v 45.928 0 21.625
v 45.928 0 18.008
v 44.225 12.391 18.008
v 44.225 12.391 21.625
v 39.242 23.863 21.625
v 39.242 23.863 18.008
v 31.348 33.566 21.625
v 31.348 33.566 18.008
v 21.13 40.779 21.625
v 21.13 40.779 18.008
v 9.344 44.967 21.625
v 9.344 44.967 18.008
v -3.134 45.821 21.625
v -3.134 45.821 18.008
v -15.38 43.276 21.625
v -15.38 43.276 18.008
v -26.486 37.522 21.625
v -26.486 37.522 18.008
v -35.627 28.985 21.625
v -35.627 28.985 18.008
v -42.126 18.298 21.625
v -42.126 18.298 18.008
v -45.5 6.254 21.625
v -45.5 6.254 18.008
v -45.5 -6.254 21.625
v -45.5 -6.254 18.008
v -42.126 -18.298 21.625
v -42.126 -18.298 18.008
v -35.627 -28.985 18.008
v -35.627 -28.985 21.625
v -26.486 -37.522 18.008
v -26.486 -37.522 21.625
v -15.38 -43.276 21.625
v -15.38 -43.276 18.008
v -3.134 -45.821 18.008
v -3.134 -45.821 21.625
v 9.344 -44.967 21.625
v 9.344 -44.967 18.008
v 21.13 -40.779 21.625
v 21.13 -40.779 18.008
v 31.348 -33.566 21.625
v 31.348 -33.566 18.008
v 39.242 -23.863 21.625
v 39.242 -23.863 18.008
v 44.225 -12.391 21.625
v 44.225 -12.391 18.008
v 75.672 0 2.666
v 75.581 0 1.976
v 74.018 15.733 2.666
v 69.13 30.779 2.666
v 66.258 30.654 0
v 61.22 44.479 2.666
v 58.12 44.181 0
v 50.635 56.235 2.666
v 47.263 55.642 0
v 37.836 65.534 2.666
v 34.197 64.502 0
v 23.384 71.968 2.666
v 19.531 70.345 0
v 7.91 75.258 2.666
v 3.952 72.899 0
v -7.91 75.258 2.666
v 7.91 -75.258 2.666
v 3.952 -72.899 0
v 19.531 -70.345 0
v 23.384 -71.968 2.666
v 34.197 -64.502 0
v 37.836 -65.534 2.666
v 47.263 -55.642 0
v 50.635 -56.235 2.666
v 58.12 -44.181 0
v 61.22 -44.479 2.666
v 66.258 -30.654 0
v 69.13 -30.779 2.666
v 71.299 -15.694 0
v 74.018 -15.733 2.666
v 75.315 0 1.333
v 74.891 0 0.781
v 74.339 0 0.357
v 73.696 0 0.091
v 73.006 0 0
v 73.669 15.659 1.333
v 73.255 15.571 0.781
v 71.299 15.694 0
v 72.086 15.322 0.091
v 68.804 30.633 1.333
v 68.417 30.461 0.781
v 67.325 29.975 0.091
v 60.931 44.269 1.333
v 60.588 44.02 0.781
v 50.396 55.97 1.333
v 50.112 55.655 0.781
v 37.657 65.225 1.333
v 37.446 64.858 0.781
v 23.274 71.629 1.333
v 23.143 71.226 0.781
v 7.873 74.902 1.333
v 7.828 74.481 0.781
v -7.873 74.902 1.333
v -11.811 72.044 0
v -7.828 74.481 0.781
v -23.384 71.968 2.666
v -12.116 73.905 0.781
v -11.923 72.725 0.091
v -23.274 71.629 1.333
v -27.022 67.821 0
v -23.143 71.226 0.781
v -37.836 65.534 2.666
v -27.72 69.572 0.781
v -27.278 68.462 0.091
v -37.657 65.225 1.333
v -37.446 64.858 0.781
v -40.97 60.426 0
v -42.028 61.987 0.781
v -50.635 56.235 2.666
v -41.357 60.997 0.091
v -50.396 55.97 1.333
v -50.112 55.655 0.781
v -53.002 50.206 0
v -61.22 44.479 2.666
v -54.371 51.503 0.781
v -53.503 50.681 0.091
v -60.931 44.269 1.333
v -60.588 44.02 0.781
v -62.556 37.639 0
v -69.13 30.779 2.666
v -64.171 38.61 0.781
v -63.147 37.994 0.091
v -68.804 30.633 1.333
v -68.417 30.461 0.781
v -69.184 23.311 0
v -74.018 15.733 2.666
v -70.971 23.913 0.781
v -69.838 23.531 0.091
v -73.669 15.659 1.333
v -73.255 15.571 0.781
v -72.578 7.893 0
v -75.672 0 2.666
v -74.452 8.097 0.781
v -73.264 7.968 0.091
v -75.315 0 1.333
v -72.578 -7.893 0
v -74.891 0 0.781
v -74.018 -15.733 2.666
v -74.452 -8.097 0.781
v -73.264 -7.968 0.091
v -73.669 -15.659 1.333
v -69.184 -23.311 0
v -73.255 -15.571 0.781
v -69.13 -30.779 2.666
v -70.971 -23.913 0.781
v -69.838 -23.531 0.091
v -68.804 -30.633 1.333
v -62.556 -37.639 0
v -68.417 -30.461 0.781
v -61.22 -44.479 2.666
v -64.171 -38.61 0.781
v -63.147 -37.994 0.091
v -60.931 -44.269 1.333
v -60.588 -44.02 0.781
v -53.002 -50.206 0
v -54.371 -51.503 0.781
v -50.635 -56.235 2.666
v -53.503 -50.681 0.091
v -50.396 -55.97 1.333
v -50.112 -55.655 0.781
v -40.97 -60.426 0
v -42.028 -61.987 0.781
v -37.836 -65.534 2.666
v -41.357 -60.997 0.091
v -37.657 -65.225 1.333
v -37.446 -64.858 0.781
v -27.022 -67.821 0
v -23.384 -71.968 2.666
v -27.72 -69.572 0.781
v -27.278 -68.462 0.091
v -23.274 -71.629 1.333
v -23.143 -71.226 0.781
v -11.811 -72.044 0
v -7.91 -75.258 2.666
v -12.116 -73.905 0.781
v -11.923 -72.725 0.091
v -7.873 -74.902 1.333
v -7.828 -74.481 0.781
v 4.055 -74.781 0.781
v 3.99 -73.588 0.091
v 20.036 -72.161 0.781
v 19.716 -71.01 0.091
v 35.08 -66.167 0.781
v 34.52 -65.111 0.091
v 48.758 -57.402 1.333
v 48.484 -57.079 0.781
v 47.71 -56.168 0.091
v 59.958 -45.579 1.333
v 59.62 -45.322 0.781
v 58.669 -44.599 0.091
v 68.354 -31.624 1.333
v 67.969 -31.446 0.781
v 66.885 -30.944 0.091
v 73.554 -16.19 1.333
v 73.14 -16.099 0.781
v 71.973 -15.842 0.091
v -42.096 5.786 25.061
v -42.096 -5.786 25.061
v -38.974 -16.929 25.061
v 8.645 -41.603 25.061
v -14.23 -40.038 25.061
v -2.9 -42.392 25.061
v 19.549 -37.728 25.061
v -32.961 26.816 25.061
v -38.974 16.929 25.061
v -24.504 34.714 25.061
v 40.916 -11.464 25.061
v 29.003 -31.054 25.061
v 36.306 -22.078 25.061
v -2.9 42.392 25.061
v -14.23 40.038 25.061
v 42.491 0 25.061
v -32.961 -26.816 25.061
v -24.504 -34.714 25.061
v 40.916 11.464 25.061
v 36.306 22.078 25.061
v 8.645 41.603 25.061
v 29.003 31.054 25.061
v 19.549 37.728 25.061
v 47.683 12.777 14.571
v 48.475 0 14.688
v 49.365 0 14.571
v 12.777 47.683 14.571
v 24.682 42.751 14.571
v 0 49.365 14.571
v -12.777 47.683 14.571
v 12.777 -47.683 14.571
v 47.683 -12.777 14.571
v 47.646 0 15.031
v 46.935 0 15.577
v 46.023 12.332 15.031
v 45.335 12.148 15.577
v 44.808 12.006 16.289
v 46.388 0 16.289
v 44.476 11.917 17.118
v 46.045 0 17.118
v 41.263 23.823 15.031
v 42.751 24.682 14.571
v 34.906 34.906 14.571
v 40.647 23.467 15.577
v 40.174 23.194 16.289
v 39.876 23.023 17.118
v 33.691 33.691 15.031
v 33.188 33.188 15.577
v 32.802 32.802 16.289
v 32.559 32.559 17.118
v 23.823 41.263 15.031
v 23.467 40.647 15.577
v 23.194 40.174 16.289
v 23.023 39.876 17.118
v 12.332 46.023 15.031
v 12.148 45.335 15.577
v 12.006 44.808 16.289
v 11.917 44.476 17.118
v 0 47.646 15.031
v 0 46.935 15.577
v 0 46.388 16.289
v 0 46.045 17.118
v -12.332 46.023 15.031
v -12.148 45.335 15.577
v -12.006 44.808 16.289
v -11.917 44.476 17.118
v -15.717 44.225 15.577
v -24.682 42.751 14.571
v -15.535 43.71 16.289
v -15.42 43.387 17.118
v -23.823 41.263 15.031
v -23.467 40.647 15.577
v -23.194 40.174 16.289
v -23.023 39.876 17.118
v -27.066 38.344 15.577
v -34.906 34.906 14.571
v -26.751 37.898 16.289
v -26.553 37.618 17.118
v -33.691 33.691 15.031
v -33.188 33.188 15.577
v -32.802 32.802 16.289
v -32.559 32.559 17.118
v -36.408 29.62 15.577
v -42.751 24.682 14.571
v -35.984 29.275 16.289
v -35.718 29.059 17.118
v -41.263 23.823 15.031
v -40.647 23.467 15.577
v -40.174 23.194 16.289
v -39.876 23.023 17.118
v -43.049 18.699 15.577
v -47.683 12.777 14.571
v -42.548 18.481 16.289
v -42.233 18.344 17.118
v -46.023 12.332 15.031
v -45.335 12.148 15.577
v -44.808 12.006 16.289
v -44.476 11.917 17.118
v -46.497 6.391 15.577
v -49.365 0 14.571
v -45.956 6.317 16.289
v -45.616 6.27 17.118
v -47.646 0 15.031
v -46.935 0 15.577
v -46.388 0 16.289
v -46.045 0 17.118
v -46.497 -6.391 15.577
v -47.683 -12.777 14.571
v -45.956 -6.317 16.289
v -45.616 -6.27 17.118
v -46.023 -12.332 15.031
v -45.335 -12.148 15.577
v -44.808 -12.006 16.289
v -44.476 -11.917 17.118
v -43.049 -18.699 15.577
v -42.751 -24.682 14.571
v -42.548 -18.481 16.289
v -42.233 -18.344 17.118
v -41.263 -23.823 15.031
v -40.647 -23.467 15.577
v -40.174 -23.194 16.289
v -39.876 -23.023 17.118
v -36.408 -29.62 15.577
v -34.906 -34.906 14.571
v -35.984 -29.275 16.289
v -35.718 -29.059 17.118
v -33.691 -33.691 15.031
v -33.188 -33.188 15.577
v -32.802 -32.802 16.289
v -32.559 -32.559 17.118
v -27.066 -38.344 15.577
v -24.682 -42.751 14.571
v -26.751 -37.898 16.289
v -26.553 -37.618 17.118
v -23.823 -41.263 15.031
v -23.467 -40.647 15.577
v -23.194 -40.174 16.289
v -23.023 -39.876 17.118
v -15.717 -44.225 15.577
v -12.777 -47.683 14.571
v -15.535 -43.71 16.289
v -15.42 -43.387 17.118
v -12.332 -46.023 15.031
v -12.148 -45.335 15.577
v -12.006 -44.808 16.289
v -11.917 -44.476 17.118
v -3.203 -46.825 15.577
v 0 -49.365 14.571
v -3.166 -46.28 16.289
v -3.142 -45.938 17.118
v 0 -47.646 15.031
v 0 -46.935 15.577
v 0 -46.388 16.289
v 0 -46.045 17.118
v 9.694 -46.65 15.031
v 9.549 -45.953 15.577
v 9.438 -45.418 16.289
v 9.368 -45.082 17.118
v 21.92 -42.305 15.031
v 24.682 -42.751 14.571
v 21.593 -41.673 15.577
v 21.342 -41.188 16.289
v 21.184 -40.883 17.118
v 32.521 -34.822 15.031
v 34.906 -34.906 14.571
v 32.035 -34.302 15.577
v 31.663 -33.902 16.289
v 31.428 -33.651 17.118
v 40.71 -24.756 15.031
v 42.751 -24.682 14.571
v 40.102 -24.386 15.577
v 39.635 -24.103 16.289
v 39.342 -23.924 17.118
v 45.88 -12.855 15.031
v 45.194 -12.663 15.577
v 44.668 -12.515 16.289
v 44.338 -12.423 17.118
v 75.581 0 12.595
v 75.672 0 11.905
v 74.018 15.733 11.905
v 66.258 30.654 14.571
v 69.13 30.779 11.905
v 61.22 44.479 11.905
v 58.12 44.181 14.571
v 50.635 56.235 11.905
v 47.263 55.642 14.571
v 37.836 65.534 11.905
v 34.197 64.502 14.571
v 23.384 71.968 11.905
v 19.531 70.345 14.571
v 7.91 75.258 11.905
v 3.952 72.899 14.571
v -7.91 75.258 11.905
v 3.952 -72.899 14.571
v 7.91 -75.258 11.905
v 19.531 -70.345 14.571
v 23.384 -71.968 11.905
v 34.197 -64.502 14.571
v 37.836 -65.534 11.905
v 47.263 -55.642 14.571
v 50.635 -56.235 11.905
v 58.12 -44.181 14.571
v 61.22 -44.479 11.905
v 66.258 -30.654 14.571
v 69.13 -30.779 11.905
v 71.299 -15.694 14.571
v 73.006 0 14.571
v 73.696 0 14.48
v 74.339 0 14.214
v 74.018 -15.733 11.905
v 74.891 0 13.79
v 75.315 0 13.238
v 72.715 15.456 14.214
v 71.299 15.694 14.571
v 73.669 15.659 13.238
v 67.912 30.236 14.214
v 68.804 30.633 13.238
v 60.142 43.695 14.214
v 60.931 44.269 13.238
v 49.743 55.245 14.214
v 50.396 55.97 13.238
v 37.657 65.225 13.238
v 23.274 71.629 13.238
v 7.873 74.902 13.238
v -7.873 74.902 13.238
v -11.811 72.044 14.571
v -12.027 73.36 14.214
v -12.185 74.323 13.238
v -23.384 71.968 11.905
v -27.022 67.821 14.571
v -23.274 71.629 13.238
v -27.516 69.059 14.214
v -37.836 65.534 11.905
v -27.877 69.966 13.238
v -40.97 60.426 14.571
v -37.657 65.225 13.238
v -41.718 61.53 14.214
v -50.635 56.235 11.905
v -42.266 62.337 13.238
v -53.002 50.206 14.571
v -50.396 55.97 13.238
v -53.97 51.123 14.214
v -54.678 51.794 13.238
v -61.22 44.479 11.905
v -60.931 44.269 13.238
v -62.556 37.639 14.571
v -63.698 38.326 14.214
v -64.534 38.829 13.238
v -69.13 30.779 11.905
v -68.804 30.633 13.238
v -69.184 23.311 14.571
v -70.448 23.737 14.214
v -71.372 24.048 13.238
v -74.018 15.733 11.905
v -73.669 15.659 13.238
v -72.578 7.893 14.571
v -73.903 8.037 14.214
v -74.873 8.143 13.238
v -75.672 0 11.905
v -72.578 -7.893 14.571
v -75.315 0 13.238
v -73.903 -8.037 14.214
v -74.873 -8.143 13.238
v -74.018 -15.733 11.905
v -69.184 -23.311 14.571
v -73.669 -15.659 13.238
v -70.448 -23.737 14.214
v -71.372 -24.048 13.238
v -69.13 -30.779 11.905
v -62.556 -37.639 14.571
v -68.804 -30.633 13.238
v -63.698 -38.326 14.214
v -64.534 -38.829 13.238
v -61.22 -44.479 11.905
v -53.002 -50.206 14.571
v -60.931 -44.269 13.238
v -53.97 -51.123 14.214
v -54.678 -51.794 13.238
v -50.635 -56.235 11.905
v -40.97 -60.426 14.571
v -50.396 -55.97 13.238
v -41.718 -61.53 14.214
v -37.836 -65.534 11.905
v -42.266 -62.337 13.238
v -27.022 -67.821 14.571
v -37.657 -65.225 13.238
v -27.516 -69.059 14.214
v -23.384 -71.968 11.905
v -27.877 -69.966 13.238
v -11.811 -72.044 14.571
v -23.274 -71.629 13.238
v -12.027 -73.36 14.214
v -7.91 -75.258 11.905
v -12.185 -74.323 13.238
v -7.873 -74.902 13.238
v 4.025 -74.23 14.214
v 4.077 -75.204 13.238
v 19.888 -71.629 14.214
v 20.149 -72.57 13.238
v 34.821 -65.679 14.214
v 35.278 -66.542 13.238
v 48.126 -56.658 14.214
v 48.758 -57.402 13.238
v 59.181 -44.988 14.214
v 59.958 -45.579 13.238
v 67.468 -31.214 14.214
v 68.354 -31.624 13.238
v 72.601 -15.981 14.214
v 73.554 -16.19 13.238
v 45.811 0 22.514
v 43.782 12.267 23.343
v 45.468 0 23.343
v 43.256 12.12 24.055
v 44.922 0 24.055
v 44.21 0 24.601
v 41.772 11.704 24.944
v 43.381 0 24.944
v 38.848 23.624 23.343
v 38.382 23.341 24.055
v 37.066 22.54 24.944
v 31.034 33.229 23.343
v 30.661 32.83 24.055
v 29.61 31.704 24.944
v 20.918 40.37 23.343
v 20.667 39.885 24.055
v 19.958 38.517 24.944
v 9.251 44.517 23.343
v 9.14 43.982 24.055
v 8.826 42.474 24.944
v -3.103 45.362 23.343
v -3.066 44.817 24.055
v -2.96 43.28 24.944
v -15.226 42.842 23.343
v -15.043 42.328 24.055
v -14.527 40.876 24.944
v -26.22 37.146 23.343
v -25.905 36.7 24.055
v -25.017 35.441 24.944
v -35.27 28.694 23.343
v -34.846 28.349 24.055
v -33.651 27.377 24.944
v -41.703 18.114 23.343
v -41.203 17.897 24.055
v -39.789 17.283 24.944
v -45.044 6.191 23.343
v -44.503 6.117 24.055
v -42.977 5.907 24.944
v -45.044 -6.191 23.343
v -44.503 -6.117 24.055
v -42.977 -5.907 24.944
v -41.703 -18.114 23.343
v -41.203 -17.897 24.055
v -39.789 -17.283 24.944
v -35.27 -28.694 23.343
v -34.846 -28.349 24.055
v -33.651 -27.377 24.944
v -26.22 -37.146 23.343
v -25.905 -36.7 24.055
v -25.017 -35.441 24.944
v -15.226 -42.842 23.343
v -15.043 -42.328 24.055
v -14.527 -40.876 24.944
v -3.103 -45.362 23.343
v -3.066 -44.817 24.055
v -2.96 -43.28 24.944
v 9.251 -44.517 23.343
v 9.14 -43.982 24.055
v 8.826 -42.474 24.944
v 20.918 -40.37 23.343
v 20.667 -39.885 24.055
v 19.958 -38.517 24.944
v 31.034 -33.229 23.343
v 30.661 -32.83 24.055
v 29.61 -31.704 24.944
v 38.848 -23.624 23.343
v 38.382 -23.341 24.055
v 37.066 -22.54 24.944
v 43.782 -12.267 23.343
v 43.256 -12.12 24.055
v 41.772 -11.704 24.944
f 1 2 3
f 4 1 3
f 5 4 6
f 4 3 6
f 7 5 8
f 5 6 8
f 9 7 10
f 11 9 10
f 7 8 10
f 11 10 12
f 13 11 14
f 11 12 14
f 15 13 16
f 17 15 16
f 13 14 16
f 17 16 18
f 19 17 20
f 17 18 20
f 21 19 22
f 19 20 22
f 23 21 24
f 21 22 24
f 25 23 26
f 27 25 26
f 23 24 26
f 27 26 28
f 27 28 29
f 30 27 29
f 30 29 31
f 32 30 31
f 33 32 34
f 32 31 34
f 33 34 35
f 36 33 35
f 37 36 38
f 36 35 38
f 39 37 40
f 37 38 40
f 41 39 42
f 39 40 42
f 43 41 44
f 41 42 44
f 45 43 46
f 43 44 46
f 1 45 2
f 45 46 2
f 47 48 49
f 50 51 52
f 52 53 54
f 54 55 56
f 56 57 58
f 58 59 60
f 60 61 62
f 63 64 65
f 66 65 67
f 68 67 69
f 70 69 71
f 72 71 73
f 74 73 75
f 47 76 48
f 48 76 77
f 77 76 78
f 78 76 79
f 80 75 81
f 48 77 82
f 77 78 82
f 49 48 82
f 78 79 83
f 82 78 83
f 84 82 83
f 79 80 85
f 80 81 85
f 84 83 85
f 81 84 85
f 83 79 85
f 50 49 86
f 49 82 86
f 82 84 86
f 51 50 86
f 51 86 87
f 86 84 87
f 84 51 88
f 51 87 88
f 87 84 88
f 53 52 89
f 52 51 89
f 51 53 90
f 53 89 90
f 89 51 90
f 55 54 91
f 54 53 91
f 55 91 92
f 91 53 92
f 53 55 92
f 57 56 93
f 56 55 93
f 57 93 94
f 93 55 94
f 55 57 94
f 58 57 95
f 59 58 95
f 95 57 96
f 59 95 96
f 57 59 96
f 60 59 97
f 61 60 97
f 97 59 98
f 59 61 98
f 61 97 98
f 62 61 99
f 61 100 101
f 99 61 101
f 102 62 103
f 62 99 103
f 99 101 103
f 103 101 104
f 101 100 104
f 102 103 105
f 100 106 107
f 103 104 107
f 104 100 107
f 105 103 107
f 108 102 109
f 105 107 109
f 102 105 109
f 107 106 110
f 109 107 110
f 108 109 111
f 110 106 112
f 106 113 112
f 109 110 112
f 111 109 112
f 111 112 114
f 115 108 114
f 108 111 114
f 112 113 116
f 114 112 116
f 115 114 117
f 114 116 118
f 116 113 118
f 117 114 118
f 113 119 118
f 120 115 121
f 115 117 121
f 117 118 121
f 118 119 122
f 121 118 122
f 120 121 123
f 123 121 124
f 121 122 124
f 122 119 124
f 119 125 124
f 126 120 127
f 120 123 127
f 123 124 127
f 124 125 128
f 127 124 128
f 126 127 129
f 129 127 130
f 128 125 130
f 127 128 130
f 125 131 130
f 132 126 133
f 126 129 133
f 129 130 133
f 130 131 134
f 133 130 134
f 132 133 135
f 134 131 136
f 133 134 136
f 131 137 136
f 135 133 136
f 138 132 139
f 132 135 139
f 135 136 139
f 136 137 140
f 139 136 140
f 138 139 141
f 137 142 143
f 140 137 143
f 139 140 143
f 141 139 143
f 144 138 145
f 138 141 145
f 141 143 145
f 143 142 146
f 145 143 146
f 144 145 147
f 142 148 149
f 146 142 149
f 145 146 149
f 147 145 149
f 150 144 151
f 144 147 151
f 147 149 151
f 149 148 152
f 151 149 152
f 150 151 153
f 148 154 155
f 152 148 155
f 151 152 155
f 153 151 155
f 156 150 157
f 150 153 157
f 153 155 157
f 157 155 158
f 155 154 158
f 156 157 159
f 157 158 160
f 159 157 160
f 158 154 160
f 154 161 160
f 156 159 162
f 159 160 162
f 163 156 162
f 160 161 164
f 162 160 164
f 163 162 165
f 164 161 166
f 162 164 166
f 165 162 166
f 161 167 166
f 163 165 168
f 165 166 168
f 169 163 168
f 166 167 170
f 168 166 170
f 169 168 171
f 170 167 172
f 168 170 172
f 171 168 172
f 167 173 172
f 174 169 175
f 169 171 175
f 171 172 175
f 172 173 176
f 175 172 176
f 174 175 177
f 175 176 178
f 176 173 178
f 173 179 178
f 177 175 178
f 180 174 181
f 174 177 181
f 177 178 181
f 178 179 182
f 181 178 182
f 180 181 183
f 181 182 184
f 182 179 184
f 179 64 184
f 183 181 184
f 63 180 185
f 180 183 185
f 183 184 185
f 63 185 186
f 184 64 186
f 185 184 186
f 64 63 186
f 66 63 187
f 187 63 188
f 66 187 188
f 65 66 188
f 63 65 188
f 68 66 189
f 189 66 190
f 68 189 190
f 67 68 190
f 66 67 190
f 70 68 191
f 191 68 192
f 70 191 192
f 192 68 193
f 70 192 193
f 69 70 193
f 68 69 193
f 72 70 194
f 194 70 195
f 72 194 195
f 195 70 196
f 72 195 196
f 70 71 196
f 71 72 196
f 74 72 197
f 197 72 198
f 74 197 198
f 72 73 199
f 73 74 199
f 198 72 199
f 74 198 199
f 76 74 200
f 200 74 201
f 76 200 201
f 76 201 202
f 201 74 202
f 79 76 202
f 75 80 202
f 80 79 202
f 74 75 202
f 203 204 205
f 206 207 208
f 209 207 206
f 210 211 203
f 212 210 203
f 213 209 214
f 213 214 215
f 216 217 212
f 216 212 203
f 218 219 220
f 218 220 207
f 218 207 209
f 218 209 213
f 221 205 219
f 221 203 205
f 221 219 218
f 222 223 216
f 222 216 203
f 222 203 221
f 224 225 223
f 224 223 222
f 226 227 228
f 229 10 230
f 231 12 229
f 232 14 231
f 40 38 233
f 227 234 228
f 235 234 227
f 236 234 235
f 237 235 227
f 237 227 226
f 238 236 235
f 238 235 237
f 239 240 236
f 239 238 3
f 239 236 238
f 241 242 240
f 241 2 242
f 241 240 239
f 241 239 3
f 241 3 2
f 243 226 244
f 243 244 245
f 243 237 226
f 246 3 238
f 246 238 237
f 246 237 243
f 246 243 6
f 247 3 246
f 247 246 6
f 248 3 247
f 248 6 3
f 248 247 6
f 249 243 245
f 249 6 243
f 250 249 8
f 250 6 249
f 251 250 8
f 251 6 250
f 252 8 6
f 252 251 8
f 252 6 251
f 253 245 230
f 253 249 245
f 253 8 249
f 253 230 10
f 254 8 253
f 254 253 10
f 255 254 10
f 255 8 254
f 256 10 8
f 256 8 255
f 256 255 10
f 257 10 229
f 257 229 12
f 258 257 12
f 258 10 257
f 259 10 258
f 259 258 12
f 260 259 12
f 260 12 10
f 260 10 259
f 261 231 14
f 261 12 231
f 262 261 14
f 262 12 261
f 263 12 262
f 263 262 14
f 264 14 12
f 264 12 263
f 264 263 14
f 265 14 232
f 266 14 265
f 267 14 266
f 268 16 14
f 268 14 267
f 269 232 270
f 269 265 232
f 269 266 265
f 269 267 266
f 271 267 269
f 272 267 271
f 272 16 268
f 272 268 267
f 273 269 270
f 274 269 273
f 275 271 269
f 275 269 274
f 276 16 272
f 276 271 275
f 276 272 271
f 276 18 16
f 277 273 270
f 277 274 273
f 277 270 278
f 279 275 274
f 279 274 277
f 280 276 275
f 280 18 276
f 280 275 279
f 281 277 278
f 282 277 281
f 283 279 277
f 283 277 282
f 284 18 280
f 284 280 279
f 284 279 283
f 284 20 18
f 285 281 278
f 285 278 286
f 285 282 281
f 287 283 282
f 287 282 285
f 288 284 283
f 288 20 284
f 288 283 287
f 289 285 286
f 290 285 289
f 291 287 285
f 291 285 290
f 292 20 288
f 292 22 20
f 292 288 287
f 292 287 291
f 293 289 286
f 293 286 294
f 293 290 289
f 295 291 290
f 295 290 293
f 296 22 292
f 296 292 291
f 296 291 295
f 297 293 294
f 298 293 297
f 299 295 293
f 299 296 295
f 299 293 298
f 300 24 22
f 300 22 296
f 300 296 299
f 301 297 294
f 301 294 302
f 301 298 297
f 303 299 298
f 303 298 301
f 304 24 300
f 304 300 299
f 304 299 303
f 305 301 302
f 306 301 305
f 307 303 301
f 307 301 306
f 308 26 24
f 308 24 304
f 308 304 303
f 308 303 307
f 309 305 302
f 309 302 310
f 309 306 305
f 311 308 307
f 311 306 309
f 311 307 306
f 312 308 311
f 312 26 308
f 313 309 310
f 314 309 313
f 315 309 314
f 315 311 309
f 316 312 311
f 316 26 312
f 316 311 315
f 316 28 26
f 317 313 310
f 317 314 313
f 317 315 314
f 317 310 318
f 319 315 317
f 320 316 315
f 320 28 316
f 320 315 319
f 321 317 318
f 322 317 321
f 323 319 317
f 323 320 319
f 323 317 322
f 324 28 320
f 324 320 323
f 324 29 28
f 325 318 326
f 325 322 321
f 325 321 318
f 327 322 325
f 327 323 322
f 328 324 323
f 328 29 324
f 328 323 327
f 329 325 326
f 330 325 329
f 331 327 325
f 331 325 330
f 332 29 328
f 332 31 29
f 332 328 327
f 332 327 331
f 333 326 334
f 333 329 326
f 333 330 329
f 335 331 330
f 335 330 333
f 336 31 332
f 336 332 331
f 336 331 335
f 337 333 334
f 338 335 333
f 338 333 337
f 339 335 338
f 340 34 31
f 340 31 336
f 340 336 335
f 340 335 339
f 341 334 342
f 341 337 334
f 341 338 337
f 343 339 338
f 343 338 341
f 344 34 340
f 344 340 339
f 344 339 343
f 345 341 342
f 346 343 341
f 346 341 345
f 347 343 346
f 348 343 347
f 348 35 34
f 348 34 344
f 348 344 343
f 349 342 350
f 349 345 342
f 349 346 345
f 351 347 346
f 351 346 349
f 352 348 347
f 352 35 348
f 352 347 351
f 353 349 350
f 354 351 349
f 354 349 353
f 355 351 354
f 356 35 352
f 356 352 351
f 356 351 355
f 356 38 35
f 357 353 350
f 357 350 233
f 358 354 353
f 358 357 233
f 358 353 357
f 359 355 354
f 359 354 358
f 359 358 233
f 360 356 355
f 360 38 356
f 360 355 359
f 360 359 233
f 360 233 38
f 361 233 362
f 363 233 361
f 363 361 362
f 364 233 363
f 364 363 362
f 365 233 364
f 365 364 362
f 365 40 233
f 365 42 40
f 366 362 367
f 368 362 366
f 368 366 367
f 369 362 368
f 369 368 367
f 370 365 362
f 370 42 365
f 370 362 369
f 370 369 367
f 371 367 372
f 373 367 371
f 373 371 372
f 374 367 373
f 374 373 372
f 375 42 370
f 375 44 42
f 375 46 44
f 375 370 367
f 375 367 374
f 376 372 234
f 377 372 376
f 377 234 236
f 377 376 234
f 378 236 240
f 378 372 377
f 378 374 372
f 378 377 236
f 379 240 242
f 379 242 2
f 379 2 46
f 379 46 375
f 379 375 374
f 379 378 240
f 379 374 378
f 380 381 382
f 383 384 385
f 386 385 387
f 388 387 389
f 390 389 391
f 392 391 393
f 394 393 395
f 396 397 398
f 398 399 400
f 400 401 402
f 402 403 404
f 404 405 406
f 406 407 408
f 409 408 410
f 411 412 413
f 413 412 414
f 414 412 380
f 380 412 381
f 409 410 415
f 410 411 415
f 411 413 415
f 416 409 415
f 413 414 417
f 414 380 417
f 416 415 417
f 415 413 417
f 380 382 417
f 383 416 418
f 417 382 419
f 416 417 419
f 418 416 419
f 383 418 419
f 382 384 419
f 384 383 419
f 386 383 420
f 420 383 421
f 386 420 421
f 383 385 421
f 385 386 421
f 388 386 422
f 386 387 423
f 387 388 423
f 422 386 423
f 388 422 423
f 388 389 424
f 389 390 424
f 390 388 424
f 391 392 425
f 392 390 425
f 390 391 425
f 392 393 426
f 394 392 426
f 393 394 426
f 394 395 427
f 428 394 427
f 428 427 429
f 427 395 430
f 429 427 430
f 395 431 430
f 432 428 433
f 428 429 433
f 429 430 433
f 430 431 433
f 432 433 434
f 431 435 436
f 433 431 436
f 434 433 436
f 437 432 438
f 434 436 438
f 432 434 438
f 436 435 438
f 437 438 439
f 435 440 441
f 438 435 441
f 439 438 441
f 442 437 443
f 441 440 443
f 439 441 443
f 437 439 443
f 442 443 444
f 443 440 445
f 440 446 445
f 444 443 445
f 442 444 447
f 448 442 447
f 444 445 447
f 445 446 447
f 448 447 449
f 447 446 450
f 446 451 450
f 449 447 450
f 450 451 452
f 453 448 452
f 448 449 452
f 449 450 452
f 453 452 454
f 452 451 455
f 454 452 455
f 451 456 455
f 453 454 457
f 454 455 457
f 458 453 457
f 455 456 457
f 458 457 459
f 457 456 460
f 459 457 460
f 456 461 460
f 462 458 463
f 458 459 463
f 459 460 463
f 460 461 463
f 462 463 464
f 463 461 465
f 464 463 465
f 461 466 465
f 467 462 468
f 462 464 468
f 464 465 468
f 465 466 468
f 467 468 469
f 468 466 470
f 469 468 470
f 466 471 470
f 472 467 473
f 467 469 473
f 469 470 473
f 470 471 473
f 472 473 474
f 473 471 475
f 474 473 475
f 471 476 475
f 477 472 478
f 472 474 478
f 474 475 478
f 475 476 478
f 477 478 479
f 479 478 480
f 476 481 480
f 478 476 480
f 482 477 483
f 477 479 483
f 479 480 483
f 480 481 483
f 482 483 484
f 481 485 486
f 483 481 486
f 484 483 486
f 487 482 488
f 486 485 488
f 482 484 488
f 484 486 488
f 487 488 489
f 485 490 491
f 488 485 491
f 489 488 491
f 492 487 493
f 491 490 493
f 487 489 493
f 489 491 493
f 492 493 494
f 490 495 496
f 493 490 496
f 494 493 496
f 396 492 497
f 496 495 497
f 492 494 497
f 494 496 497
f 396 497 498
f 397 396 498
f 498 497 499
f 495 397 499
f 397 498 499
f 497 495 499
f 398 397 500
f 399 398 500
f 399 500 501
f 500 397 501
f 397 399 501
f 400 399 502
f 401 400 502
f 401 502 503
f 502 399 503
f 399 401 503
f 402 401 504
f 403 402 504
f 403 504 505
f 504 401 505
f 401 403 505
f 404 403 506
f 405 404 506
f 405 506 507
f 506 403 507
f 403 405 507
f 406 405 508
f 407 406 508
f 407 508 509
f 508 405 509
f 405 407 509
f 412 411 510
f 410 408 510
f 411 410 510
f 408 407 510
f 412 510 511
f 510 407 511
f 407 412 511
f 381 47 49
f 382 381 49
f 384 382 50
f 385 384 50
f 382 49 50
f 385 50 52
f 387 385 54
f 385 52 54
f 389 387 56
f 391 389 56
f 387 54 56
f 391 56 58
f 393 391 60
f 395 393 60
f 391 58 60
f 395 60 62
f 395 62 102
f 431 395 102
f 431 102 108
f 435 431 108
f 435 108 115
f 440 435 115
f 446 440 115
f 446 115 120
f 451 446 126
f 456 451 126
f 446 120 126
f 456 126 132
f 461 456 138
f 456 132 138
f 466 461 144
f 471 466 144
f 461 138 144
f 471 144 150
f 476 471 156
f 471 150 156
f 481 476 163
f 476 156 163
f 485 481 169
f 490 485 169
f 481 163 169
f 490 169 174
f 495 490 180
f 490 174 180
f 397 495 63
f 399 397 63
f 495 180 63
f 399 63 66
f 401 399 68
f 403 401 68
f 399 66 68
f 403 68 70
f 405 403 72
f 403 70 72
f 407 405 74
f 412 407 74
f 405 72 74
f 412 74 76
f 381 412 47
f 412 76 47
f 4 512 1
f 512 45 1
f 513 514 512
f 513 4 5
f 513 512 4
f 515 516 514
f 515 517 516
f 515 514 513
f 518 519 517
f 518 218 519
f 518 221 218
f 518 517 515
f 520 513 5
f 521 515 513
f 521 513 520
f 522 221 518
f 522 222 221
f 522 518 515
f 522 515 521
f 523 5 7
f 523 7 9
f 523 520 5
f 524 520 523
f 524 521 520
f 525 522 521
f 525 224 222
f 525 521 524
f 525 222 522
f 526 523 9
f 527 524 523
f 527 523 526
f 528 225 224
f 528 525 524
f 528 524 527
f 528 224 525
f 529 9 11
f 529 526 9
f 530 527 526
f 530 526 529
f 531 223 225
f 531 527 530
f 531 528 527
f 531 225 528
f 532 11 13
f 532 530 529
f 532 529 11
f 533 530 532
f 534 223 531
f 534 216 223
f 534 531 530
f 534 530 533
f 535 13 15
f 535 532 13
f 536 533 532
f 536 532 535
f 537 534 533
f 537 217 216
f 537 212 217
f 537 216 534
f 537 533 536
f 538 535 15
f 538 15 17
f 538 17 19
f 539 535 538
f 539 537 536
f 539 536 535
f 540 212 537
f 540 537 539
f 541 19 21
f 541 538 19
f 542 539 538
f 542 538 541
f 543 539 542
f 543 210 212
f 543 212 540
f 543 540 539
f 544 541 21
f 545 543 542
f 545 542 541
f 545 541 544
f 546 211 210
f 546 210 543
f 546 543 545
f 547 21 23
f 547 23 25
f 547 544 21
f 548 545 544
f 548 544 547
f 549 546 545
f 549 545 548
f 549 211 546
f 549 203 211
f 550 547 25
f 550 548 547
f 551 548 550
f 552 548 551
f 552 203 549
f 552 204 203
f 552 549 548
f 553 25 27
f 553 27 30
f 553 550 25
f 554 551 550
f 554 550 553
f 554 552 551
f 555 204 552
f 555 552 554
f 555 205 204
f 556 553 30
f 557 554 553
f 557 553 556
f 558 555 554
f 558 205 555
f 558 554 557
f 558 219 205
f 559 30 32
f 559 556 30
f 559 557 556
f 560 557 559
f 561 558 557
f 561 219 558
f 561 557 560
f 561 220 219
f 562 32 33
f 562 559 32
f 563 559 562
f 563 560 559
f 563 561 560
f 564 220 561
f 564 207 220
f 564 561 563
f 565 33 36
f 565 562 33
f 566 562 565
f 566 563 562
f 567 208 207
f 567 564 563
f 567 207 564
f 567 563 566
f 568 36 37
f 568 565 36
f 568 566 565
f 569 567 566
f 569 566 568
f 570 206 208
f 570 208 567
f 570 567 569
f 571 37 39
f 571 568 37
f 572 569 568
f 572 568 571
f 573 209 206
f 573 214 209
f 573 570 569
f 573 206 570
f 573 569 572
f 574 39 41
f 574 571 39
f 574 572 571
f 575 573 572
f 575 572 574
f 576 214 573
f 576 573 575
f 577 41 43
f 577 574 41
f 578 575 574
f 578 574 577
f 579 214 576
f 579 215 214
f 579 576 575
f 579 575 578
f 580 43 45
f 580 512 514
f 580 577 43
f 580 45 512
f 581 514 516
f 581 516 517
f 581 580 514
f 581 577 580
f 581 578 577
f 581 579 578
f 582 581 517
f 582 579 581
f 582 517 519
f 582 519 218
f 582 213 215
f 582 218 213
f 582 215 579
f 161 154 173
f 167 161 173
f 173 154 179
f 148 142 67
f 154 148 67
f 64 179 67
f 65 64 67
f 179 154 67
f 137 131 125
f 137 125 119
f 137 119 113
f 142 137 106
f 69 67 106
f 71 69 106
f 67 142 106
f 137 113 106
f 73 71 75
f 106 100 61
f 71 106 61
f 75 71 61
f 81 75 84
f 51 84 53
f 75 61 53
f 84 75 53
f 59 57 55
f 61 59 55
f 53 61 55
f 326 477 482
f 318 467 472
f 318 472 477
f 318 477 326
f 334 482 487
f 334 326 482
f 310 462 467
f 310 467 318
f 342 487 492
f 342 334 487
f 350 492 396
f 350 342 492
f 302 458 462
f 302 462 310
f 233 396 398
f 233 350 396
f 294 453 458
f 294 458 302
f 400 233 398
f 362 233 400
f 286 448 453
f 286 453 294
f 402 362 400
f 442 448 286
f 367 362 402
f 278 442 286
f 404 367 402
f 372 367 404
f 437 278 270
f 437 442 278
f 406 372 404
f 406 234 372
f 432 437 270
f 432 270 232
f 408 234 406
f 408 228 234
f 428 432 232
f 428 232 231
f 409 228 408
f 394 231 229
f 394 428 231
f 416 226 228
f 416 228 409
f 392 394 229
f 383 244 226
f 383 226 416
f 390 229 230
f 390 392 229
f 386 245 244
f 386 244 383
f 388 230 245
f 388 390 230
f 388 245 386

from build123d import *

# Parameters (mm, degrees)
F0_R     = 75.672097
F1_DEPTH = 14.57094
F2_R     = 45.928077
F3_DEPTH = 10.490498
F4_R     = 3.436595
F5_R     = 2.666092


with BuildPart() as f1:
    # F0 (on Top) → F1 (new body)
    with BuildSketch(Plane.XY):
        Circle(F0_R)
    extrude(amount=F1_DEPTH)

    # F2 (on face) → F3 (join)
    with BuildSketch(Plane.XY.offset(14.57094)):
        Circle(F2_R)
    extrude(amount=F3_DEPTH)

    # F4
    f4_edges = [f1.edges().sort_by_distance(p)[0] for p in [
        (45.928077, 0, 19.816189),
        (-45.928077, 0, 14.57094),
        (-45.928077, 0, 25.061438),
    ]]
    fillet(f4_edges, radius=F4_R)

    # F5
    f5_edges = [f1.edges().sort_by_distance(p)[0] for p in [
        (75.672097, 0, 7.28547),
        (-75.672097, 0, 0),
        (-75.672097, 0, 14.57094),
    ]]
    fillet(f5_edges, radius=F5_R)


solid = f1.part
